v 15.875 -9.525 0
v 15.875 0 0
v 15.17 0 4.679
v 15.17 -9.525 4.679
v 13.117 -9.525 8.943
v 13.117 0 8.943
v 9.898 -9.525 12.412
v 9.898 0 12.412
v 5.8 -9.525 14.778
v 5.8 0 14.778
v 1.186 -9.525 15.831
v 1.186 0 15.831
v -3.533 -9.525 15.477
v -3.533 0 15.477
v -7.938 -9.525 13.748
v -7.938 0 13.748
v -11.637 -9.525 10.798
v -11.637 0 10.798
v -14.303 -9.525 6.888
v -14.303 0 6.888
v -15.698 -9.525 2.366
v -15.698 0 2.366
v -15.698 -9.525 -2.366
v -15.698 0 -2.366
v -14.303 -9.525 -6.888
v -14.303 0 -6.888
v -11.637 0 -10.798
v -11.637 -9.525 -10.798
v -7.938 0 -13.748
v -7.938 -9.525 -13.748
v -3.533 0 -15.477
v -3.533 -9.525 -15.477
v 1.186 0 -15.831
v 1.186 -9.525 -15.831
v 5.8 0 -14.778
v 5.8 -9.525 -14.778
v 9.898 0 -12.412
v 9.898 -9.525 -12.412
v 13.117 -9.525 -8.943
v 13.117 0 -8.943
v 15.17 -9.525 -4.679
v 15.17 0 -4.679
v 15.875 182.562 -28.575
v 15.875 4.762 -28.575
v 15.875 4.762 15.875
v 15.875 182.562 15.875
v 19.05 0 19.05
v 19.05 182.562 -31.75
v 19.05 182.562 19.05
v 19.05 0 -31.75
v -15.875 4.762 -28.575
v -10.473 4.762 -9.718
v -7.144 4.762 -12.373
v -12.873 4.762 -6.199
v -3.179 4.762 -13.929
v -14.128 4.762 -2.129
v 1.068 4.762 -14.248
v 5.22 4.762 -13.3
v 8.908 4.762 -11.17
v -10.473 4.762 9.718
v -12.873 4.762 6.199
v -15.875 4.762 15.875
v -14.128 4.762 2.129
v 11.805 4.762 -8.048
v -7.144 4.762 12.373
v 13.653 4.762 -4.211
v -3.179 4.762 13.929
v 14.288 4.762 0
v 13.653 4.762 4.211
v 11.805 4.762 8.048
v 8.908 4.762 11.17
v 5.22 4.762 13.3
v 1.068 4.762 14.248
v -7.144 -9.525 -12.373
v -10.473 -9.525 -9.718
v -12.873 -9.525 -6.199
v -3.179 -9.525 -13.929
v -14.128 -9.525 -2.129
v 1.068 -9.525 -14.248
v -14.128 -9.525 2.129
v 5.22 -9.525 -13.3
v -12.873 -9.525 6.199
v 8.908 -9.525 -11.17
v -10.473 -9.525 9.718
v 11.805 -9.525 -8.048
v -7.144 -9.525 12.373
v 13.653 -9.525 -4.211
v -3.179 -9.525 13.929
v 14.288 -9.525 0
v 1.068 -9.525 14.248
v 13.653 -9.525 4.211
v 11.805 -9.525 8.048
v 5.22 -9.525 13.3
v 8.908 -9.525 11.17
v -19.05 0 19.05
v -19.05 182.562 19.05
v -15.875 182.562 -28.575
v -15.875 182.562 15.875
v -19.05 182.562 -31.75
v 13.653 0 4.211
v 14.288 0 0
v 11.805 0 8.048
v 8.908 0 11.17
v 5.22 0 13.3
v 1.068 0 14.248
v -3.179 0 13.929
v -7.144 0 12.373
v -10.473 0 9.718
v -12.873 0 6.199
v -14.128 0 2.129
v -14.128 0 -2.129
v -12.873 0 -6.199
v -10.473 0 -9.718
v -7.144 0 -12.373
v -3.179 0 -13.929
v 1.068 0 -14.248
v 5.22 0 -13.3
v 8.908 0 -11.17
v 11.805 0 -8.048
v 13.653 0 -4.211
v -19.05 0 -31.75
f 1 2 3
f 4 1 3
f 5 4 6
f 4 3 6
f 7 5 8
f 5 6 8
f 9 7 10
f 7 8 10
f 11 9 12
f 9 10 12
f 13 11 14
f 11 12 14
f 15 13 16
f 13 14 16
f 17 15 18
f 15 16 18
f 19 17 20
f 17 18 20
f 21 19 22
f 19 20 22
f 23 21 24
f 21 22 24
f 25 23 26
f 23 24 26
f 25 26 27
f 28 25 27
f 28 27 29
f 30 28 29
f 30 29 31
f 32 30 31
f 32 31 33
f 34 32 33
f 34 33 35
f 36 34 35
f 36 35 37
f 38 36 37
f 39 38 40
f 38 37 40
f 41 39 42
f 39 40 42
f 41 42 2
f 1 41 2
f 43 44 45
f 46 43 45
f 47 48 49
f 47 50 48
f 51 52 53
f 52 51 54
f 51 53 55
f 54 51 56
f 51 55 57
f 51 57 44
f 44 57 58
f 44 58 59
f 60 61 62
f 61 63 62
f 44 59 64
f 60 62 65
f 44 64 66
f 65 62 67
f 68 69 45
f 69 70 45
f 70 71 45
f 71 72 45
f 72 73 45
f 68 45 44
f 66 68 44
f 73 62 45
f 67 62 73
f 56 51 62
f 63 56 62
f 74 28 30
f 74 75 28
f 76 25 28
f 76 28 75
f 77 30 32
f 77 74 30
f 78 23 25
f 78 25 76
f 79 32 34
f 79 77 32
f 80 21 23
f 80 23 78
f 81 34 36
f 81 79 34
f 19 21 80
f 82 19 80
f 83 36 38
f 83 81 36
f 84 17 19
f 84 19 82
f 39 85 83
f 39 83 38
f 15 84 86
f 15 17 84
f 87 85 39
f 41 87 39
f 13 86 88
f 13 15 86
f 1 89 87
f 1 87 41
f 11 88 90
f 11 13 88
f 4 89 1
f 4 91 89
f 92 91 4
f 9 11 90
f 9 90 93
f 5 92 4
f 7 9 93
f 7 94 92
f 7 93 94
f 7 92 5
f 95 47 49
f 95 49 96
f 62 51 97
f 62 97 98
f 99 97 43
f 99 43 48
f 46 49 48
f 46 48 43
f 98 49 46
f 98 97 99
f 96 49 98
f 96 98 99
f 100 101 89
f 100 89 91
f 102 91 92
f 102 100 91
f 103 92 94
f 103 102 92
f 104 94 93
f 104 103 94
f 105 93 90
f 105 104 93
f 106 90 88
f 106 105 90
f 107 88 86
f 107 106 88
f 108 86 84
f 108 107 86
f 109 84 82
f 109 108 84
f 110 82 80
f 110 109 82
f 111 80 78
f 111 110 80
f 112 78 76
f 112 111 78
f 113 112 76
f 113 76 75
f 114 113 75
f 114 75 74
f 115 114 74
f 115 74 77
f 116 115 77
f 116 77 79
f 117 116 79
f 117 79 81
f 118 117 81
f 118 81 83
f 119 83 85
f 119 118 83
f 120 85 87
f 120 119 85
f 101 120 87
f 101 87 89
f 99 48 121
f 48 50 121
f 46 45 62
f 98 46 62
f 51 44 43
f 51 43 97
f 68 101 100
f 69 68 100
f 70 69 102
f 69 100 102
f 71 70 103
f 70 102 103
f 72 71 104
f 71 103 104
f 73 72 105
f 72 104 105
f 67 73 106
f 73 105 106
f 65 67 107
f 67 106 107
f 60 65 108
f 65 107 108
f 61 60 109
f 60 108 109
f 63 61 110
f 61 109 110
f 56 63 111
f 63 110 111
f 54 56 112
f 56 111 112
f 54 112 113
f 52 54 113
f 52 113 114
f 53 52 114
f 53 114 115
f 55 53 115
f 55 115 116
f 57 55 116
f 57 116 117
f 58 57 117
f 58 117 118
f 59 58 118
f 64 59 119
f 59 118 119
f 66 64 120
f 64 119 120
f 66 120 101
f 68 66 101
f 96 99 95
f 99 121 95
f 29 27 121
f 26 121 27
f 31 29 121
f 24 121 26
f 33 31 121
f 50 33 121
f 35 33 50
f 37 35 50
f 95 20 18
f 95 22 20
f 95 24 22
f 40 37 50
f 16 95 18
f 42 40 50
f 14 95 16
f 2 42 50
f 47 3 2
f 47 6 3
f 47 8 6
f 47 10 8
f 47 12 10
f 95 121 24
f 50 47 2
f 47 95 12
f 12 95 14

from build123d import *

# Parameters (mm, degrees)
F0_R     = 15.875
F0_R_2   = 14.2875
F1_DEPTH = 9.525
F2_W     = 38.1
F2_H     = 50.8
F2_R     = 14.2875
F3_DEPTH = 4.7625
F4_W     = 38.1
F4_H     = 50.8
F4_W_2   = 31.75
F4_H_2   = 44.45
F5_DEPTH = 177.8


with BuildPart() as f1:
    # F0 (on Front) → F1 (new body)
    with BuildSketch(Plane.XZ):
        Circle(F0_R)
        Circle(F0_R_2, mode=Mode.SUBTRACT)
    extrude(amount=F1_DEPTH)

    # F2 (on Front) → F3 (join)
    with BuildSketch(Plane.XZ):
        with Locations((0, -6.35)):
            Rectangle(F2_W, F2_H)
        Circle(F2_R, mode=Mode.SUBTRACT)
    extrude(amount=-F3_DEPTH)

    # F4 (on face) → F5 (join)
    with BuildSketch(Plane(origin=(0, 4.7625, 0), x_dir=(-1, 0, 0), z_dir=(0, 1, 0))):
        with Locations((0, -6.35)):
            Rectangle(F4_W, F4_H)
        with Locations((0, -6.35)):
            Rectangle(F4_W_2, F4_H_2, mode=Mode.SUBTRACT)
    extrude(amount=F5_DEPTH)


solid = f1.part
